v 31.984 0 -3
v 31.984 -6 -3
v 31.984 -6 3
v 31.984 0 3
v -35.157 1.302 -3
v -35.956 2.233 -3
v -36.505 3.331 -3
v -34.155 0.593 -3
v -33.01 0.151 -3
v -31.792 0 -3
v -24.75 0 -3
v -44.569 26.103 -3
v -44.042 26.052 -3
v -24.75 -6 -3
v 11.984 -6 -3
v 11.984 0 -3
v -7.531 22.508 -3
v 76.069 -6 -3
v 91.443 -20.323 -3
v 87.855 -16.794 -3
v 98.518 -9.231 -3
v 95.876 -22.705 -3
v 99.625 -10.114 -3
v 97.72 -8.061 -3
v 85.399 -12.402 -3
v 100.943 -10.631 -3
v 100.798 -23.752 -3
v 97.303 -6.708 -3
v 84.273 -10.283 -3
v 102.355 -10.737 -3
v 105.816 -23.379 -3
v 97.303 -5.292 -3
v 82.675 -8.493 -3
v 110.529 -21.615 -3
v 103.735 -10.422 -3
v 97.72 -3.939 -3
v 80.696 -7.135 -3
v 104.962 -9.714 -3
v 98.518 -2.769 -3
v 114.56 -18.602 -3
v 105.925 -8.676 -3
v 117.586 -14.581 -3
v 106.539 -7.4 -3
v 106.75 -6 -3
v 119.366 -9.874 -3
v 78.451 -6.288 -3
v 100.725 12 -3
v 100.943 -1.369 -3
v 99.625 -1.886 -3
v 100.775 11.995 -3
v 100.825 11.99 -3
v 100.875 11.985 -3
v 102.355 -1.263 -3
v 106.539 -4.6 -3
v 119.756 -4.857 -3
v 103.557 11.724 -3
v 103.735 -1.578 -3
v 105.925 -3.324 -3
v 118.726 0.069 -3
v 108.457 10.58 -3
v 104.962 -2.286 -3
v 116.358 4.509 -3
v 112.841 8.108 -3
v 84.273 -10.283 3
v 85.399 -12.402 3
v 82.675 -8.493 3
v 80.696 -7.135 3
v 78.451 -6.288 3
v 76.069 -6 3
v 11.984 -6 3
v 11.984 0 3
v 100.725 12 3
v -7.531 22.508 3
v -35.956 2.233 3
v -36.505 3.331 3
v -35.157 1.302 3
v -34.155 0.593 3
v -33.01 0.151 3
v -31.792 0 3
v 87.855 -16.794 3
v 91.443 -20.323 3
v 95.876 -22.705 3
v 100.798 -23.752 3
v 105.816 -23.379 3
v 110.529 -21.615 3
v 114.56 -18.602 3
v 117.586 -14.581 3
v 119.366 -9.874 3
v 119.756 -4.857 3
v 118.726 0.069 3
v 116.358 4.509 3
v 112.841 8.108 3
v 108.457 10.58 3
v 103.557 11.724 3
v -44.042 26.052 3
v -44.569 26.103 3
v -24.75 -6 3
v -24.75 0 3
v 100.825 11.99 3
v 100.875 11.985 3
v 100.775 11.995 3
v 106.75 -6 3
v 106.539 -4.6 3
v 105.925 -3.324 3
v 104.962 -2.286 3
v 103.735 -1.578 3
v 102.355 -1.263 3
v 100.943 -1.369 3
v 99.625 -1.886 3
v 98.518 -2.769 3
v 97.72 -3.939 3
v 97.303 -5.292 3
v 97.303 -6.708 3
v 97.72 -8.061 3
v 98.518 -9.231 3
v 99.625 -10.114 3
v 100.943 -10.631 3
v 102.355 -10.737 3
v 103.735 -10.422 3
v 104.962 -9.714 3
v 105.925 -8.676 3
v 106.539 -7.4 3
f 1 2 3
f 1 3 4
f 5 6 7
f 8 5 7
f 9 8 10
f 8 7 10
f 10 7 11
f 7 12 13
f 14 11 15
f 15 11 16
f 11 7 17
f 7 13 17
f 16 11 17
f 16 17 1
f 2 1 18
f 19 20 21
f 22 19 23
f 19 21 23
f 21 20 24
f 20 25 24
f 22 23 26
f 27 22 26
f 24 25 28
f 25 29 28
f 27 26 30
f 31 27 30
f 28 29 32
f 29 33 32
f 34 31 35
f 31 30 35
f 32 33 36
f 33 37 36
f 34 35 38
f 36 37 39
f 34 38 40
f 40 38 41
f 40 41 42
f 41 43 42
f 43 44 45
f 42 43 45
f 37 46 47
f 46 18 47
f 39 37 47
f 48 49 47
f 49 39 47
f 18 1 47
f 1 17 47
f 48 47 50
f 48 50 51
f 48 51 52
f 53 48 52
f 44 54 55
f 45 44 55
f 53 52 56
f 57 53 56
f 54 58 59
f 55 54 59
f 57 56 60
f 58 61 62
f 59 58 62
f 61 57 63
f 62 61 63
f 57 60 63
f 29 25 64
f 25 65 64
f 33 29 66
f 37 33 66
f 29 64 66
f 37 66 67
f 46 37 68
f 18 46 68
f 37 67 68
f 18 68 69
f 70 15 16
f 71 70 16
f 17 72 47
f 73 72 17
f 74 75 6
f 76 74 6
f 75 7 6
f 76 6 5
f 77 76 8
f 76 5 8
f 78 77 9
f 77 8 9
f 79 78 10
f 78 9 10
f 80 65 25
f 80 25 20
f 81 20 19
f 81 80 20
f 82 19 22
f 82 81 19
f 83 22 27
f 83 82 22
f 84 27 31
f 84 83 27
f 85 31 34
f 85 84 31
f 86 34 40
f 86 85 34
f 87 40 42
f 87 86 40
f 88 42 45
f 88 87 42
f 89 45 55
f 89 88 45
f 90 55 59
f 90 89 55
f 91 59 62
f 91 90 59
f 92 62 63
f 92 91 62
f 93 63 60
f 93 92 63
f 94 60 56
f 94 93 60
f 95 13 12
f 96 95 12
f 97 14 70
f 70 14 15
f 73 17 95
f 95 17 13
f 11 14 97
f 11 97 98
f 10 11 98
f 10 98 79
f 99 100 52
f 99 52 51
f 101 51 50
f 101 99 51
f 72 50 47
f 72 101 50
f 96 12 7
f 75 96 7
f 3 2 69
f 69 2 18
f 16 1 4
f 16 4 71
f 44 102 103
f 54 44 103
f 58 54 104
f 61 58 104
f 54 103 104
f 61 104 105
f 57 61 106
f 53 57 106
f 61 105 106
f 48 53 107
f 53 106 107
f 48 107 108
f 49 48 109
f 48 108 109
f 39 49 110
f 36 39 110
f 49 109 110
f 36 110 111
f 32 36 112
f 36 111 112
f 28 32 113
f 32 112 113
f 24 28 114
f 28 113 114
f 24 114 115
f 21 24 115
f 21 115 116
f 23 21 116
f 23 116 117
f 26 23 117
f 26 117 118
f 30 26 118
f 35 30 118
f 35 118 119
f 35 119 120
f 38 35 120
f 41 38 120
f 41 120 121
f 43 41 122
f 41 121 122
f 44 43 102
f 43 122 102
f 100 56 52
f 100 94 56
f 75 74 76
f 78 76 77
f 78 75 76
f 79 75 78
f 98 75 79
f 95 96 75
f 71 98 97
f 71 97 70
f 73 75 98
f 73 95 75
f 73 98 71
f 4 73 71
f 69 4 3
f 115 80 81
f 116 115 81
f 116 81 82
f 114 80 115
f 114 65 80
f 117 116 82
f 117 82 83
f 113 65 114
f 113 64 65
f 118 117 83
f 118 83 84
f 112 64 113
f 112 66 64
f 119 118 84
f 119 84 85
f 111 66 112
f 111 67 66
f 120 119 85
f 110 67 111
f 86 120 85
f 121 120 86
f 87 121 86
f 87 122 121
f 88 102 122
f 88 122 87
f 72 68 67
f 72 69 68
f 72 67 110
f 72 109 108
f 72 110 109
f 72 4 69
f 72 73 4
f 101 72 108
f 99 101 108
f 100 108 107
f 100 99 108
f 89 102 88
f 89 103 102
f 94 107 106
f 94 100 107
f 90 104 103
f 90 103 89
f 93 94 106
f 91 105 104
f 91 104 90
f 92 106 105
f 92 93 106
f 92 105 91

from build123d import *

# Parameters (mm, degrees)
SKETCH1_R           = 5.5
BOSS_EXTRUDE1_DEPTH = 3
MOVE_START          = -3
MOVE_FACE1_DEPTH    = 6
SKETCH3_R           = 17.792629247
SKETCH3_R_2         = 4.75
BOSS_EXTRUDE3_DEPTH = 6
FILLET3_R           = 147
FILLET4_R           = 10
SKETCH5_W           = 25
SKETCH5_H           = 6
SKETCH5_W_2         = 20
CUT_EXTRUDE1_DEPTH  = 123.739451528
MOVE_FACE2_DEPTH    = 6
FILLET5_R           = 5


with BuildPart() as part:
    # Sketch1 → Boss-Extrude1 (new, symmetric)
    with BuildSketch(Plane.XY):
        with BuildLine():
            Line((100.725085642, 12), (-7.531031869, 22.507881701))
            Line((-7.531031869, 22.507881701), (0, 0))
            Line((0, 0), (2.007571917, -6))
            Line((2.007571917, -6), (88.851239866, -6))
            ThreePointArc((88.851239866, -6), (98.632352269, -18.710186538), (113.423722773, -12.510641371))
            ThreePointArc((113.423722773, -12.510641371), (113.737903109, 3.196949424), (100.725085642, 12))
        make_face()
        with Locations((102, -6)):
            Circle(SKETCH1_R, mode=Mode.SUBTRACT)
    extrude(amount=BOSS_EXTRUDE1_DEPTH, both=True)

    # Move Face1: read off the stored shape, not the designer's step
    # Move Face1 outline → Move Face1 (add)
    with BuildSketch(Plane.XY.offset(MOVE_START)):
        Polygon((-7.531031869, 22.5078817), (-44.042319528, 26.051850395), (-33.317920404, -6), (2.007571917, -6), align=None)
    extrude(amount=MOVE_FACE1_DEPTH)

    # Sketch3 → Boss-Extrude3 (add)
    with BuildSketch(Plane.XY.offset(3)):
        with Locations((102, -6)):
            Circle(SKETCH3_R)
        with Locations((102, -6)):
            Circle(SKETCH3_R_2, mode=Mode.SUBTRACT)
    extrude(amount=-BOSS_EXTRUDE3_DEPTH)

    # Fillet3
    fillet3_edges = [part.edges().sort_by_distance(p)[0] for p in [
        (102.186094391, 11.791656034, 0),
    ]]
    fillet(fillet3_edges, radius=FILLET3_R)

    # Fillet4
    fillet4_edges = [part.edges().sort_by_distance(p)[0] for p in [
        (84.207370753, -6, 0),
    ]]
    fillet(fillet4_edges, radius=FILLET4_R)

    # Sketch5 → Cut-Extrude1 (cut, through all)
    with BuildSketch(Plane(origin=(0, 0, -3), x_dir=(-1, 0, 0), z_dir=(0, 0, -1))):
        with Locations((37.25, -3)):
            Rectangle(SKETCH5_W, SKETCH5_H)
        with Locations((-21.983719278, -3)):
            Rectangle(SKETCH5_W_2, SKETCH5_H)
    extrude(amount=-CUT_EXTRUDE1_DEPTH, mode=Mode.SUBTRACT)

    # Move Face2: read off the stored shape, not the designer's step
    # Move Face2 outline → Move Face2 (add)
    with BuildSketch(Plane.XY.offset(MOVE_START)):
        Polygon((-44.569041147, 26.102976637), (-35.325492321, 0), (-44.042319528, 26.051850395), align=None)
    extrude(amount=MOVE_FACE2_DEPTH)

    # Fillet5
    fillet5_edges = [part.edges().sort_by_distance(p)[0] for p in [
        (-35.325492321, 0, 0),
    ]]
    fillet(fillet5_edges, radius=FILLET5_R)


solid = part.part
